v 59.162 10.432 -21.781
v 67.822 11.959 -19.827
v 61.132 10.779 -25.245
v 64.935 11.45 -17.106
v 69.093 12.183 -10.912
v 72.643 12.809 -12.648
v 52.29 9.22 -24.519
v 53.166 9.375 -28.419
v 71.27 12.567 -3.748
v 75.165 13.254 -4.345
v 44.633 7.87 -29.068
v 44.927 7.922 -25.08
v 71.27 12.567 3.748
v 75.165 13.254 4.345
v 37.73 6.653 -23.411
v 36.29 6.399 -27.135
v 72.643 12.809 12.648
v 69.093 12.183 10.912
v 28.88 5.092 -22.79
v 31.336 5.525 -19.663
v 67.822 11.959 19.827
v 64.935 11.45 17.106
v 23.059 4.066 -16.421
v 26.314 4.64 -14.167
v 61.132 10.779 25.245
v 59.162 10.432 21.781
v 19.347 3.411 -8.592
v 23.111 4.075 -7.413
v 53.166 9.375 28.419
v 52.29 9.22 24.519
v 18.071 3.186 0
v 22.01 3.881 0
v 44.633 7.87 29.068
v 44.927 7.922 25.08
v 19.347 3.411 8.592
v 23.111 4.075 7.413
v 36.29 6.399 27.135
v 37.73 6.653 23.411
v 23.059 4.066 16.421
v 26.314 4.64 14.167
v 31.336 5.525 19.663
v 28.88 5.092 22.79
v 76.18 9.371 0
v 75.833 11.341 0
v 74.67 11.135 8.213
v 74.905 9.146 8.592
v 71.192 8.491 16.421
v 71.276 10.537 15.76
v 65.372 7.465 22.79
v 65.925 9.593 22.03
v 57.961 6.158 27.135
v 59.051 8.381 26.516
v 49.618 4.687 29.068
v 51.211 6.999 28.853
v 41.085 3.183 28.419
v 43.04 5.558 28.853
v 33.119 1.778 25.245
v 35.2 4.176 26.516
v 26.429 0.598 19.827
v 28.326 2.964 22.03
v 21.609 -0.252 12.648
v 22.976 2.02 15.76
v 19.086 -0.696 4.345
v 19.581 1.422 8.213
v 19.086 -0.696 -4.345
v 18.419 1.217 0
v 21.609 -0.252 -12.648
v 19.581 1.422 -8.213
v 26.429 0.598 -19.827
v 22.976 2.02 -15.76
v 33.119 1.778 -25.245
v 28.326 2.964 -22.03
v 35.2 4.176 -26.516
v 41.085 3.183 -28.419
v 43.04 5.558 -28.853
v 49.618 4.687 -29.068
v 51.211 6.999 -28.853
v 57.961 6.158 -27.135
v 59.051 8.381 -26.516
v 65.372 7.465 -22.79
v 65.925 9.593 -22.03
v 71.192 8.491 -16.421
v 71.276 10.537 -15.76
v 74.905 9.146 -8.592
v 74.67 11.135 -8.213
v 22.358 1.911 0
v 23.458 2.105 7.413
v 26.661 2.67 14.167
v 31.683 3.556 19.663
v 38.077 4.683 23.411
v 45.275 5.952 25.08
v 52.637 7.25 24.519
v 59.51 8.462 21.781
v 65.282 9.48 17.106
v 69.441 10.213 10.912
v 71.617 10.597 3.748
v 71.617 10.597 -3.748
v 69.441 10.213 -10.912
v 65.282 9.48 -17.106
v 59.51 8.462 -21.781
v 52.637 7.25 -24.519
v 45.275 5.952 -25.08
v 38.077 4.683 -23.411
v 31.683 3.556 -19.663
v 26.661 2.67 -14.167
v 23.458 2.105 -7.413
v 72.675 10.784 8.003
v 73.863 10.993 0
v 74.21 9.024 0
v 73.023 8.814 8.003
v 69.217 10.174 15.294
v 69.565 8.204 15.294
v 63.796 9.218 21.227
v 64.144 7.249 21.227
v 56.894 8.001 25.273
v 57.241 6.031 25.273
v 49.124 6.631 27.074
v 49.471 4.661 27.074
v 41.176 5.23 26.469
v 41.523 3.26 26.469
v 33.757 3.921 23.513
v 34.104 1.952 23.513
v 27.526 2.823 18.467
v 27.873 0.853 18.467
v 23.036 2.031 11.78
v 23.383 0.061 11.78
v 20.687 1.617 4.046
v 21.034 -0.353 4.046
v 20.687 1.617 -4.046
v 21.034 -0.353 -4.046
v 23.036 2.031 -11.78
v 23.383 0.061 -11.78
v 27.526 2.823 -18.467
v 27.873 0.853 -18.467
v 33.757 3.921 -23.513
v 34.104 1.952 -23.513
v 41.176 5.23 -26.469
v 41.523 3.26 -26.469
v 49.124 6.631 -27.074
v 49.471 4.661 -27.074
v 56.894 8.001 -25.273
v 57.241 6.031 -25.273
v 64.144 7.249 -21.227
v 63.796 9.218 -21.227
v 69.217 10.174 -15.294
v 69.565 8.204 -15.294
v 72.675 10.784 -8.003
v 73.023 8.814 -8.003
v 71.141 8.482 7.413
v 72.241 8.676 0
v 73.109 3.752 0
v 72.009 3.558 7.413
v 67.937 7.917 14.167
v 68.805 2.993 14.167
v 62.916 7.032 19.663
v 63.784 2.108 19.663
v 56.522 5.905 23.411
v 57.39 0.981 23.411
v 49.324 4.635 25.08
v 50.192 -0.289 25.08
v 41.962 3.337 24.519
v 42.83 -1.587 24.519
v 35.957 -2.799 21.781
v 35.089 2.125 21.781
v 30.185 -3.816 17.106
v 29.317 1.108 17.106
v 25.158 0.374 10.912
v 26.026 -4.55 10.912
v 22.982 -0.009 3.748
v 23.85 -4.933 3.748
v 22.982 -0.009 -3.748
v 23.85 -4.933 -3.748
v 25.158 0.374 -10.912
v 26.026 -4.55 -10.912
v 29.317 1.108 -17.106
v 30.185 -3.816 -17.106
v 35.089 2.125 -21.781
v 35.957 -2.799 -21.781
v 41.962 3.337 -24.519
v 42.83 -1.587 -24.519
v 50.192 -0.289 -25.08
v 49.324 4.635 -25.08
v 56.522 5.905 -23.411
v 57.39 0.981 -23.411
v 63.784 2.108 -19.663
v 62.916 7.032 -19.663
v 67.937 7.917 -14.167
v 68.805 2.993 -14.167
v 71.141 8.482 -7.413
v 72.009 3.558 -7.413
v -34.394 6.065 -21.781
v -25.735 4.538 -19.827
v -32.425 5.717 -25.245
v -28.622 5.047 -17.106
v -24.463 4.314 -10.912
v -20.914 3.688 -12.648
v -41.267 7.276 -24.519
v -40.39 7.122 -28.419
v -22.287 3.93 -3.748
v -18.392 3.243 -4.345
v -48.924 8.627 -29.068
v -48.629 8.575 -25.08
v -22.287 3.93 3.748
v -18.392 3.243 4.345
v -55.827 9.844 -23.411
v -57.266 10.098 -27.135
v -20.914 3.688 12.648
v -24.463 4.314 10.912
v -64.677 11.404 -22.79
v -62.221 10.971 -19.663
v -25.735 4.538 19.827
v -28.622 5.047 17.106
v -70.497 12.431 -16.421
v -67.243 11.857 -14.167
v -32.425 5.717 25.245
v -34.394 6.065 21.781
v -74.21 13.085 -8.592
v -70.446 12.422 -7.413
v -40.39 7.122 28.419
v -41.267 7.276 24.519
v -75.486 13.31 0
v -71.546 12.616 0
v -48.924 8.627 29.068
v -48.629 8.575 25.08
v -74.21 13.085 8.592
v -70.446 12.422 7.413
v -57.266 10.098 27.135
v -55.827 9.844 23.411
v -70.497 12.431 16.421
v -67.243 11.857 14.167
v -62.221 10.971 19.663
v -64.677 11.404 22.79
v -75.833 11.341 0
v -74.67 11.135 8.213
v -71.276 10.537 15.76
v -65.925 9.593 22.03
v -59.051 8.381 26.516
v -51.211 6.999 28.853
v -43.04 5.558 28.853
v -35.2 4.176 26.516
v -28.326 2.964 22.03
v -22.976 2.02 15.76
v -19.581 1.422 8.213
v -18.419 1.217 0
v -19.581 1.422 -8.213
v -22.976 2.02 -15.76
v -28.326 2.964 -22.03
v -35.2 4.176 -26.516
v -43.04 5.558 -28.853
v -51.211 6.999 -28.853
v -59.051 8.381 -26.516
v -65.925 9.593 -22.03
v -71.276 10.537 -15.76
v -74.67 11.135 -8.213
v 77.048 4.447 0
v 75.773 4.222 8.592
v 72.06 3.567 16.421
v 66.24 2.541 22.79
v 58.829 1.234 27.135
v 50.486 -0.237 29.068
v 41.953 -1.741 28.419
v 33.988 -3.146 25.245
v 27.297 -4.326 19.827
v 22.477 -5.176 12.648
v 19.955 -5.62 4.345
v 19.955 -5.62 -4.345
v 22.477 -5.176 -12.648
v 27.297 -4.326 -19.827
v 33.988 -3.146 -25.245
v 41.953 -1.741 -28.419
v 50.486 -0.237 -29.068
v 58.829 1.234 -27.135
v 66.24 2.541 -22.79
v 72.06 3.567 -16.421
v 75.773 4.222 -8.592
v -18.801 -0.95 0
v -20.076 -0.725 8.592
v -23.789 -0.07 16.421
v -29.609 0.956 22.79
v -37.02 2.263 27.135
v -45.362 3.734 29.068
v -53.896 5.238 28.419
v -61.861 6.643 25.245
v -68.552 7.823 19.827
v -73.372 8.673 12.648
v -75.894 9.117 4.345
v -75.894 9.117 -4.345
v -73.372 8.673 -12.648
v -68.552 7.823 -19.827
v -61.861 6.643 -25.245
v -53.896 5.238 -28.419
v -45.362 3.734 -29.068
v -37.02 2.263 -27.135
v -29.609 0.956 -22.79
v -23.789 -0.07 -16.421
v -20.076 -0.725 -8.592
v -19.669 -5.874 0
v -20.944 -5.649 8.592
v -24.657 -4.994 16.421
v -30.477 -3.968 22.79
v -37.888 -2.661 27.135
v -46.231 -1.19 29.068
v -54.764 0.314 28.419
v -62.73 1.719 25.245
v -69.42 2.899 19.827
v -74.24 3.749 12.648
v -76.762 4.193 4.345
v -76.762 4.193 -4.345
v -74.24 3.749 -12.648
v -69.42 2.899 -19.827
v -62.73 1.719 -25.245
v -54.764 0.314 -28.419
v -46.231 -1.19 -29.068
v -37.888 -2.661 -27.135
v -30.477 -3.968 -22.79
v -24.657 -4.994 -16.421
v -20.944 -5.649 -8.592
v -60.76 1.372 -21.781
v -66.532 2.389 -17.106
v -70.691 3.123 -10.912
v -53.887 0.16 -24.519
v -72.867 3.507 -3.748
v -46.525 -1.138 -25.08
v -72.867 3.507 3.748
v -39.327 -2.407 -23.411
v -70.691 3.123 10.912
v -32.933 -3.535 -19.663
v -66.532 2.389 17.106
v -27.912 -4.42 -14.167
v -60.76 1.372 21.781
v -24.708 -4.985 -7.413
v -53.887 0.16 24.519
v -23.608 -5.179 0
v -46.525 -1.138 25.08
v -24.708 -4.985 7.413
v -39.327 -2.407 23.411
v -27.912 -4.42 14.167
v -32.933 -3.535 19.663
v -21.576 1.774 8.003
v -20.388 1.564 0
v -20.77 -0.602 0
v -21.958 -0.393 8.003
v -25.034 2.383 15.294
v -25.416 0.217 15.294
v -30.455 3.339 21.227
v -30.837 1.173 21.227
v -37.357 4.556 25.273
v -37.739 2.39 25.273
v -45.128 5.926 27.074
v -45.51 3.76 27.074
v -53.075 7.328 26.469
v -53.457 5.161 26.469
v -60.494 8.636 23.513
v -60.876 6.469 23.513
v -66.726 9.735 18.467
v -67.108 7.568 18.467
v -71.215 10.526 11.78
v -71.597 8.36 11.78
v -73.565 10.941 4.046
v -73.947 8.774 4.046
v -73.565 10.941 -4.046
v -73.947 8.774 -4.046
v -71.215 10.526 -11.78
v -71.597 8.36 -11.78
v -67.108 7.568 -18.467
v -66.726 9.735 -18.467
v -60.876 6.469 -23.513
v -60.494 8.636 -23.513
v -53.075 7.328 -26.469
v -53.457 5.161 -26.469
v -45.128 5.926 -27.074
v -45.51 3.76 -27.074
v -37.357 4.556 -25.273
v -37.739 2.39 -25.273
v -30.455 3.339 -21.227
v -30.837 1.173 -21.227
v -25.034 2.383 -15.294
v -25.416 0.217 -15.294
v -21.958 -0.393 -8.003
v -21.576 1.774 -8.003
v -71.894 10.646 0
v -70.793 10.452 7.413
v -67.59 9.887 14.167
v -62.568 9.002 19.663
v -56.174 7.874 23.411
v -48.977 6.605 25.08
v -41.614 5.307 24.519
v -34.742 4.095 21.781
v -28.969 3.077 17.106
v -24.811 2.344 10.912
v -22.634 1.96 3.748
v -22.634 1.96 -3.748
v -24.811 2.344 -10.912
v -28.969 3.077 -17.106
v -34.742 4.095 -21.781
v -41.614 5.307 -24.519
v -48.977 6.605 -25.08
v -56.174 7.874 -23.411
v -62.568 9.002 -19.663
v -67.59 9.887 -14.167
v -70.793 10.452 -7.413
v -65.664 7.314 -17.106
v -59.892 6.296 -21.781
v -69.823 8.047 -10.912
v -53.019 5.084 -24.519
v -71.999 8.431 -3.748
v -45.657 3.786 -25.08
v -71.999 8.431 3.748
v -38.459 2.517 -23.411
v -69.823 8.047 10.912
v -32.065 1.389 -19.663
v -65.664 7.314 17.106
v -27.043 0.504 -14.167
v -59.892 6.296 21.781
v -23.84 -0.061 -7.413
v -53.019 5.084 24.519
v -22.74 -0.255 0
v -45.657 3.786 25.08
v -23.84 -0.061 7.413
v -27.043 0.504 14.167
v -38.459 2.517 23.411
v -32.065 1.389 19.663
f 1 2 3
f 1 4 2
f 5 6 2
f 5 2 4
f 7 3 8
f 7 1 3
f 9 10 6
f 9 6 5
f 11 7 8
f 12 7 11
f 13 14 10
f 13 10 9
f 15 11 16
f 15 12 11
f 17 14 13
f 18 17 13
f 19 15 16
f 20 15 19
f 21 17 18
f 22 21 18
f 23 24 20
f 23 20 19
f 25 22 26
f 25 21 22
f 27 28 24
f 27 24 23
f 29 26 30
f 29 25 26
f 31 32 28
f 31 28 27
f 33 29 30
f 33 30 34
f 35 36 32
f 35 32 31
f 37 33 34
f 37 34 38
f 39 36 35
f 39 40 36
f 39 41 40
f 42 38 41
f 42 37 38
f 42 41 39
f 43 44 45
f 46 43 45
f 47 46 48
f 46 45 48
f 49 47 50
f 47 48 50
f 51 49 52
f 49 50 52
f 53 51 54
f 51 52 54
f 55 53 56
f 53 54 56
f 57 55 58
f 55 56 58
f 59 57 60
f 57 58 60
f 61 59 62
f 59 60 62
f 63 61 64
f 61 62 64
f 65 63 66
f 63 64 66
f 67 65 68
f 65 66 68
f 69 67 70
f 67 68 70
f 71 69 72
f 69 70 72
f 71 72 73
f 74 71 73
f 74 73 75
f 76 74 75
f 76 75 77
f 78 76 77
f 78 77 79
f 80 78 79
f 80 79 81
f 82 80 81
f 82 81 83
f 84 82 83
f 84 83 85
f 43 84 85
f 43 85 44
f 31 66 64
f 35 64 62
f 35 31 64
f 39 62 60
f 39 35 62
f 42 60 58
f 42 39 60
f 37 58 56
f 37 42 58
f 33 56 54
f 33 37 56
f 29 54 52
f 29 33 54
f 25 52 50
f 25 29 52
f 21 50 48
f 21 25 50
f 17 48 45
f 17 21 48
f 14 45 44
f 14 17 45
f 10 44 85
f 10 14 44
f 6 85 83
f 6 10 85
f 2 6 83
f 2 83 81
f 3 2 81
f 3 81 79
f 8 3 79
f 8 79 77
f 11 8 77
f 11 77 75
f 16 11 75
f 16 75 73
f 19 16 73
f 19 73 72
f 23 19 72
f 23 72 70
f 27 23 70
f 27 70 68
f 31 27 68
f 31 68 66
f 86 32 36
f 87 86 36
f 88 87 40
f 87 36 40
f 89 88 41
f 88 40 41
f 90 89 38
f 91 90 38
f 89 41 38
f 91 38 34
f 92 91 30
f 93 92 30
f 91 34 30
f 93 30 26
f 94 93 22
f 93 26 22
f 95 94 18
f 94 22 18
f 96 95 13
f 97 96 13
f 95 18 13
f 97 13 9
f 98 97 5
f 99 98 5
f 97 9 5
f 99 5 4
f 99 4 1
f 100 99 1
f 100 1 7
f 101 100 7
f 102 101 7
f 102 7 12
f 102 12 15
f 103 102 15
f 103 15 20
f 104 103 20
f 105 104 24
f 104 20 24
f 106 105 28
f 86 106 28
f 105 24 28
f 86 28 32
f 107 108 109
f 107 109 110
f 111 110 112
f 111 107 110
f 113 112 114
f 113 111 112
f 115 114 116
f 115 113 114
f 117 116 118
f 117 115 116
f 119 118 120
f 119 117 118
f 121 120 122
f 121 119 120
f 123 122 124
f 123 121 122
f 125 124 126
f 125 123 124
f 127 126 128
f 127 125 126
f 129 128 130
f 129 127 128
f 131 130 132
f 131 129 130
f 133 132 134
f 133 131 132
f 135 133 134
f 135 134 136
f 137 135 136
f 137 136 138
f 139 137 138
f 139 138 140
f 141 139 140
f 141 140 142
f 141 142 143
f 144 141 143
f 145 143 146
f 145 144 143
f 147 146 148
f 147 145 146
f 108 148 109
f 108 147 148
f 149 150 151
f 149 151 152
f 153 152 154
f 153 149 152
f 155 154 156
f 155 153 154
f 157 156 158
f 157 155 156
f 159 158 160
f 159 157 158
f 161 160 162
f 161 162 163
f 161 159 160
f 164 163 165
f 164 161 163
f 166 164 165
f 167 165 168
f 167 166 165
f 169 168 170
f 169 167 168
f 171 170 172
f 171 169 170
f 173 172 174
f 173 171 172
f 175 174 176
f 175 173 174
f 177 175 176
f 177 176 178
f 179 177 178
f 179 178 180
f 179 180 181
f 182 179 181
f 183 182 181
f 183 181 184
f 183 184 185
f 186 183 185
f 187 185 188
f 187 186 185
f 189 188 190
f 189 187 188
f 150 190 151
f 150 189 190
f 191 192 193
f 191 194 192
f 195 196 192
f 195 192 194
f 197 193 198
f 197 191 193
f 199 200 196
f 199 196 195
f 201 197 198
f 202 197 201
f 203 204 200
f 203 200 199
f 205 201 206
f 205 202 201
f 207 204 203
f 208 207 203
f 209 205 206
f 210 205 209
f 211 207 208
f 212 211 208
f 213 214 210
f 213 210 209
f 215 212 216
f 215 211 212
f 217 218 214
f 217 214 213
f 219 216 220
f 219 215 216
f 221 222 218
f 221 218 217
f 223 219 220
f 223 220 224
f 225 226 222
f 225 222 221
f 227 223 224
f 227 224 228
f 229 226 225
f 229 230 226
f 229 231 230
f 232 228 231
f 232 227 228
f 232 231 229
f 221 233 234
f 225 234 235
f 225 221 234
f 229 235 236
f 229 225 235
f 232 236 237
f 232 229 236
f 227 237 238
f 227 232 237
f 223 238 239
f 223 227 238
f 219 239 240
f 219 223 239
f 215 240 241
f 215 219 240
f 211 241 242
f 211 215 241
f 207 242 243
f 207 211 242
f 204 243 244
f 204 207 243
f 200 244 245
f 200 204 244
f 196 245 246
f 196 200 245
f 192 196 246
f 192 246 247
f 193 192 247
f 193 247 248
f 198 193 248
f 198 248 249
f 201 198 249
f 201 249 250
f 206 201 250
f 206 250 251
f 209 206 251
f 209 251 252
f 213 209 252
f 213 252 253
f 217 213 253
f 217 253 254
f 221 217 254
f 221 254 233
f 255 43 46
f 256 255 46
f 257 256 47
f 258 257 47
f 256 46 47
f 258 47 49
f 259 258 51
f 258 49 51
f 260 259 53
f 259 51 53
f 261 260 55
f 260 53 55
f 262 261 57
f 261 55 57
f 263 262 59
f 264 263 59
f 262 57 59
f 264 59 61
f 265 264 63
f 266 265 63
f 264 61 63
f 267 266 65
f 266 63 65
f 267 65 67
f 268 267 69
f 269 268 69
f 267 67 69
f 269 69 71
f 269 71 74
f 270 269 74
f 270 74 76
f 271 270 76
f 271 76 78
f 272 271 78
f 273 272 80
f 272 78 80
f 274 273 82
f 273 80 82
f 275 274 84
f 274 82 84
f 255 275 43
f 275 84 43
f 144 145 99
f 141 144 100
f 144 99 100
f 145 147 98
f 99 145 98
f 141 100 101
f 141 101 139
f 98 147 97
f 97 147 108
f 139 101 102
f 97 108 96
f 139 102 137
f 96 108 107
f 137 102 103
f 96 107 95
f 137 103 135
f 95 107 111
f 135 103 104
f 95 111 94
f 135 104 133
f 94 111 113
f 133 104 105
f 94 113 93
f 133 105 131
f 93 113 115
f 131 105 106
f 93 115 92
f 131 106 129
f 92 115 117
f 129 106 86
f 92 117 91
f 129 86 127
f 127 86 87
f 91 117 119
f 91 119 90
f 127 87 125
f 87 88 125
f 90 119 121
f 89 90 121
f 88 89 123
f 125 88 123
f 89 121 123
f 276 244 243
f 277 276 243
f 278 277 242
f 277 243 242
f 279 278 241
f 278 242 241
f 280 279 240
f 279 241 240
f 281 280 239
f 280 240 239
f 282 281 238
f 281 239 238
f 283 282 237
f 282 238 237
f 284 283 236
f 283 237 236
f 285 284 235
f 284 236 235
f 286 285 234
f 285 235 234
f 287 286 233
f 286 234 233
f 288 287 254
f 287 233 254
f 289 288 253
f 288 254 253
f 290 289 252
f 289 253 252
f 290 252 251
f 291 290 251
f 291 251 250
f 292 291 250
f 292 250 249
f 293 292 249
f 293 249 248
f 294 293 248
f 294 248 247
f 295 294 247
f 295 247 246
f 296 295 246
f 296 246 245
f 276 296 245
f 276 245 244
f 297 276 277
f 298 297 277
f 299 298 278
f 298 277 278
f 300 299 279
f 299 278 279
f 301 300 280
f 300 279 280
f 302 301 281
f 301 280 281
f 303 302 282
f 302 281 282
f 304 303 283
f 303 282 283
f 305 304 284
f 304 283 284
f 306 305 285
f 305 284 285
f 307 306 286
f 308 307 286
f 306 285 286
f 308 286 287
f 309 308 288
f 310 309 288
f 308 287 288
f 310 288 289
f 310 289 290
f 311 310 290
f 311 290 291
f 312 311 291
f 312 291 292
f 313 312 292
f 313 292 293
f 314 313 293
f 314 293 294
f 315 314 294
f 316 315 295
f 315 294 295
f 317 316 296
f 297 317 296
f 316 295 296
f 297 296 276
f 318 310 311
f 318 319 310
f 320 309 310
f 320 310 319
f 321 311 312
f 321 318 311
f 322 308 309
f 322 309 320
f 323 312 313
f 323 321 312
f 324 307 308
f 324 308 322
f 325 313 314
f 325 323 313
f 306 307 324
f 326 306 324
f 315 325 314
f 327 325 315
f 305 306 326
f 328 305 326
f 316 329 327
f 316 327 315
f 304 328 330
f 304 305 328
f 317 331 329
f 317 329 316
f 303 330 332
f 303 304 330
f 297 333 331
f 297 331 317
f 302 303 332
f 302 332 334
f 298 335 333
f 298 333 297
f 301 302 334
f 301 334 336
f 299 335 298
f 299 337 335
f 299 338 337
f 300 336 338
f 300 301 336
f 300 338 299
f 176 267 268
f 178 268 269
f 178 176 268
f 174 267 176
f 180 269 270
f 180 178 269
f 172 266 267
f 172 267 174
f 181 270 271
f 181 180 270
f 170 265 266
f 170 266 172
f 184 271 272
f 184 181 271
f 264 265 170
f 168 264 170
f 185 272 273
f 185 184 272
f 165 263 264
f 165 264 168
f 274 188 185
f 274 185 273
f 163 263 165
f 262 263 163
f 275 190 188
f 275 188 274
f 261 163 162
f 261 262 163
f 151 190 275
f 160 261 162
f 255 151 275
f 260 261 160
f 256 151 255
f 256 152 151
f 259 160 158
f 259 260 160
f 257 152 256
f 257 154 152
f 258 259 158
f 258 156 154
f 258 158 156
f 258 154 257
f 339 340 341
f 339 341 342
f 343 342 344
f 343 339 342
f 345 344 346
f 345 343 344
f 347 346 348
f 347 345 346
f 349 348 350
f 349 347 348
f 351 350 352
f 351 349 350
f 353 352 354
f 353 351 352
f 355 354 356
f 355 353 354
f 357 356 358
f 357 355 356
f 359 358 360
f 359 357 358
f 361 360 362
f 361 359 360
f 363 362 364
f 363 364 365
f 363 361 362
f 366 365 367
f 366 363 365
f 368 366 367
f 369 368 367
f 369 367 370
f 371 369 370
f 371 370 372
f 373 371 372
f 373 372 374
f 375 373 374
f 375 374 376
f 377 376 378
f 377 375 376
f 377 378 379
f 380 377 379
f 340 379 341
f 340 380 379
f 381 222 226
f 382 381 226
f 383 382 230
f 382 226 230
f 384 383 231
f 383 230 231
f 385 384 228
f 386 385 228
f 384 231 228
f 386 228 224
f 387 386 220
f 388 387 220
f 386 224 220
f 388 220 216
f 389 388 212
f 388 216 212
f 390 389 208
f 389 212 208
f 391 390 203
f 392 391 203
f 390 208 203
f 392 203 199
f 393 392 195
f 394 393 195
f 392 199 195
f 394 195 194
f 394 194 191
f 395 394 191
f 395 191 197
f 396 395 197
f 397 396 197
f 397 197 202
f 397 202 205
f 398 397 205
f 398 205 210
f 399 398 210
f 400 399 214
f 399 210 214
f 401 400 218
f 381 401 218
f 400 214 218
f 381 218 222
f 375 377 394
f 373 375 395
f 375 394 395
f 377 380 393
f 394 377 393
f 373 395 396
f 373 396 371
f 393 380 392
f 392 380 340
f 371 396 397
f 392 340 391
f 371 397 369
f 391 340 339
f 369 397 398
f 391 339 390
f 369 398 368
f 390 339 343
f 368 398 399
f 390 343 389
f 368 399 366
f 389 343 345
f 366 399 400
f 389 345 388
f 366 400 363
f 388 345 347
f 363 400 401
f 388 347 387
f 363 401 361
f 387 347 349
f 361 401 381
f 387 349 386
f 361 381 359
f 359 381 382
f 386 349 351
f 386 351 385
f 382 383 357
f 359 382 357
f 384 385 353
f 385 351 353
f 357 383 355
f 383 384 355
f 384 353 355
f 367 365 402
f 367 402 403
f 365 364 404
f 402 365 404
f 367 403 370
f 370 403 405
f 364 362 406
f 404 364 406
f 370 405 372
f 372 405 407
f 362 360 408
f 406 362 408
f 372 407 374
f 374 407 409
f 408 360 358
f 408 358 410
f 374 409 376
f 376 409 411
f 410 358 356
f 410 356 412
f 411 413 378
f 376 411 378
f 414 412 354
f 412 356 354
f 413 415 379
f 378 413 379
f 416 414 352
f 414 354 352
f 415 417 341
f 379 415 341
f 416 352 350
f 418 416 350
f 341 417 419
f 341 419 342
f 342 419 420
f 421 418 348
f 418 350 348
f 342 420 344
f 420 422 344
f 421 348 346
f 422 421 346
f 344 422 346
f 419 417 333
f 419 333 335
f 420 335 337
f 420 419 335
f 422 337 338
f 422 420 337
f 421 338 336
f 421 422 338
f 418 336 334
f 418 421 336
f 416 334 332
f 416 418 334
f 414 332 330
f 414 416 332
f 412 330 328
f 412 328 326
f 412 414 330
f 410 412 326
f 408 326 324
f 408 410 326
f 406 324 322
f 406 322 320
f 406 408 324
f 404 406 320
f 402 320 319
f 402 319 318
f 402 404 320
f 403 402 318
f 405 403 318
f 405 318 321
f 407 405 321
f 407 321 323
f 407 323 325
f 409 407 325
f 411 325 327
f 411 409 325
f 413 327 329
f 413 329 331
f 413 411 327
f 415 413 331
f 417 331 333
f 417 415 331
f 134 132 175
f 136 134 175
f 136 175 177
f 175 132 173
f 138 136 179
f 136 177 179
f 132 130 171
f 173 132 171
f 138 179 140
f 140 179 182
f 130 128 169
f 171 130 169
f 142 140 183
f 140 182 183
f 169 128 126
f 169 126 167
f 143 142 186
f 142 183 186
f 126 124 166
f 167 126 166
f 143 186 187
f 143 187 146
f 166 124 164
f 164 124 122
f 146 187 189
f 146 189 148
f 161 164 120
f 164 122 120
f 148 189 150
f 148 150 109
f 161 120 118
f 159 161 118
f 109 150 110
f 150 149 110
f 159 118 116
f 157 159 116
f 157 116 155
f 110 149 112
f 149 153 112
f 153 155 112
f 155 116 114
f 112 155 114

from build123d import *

# Parameters (mm, degrees)
F2_R      = 29.15
F2_R_2    = 25.15
F3_DEPTH  = 2
F4_R      = 29.15
F4_R_2    = 27.15
F5_DEPTH  = 2.2
F6_R      = 29.15
F6_R_2    = 27.15
F6_R_3    = 25.15
F7_DEPTH  = 5
F9_R      = 29.15
F9_R_2    = 25.15
F10_DEPTH = 2
F11_R     = 29.15
F11_R_2   = 27.15
F12_DEPTH = 2
F13_R     = 29.15
F13_R_2   = 27.15
F13_R_3   = 25.15
F14_DEPTH = 5


with BuildPart() as f3:
    # F2 (on line) → F3 (new body)
    with BuildSketch(Plane(origin=(0, 0, 0), x_dir=(-0.984807753, 0.1736481777, 0), z_dir=(0.1736481777, 0.984807753, 0))):
        with Locations((47.5, 0)):
            Circle(F2_R)
        with Locations((47.5, 0)):
            Circle(F2_R_2, mode=Mode.SUBTRACT)
    extrude(amount=-F3_DEPTH)

    # F4 (on face) → F5 (join)
    with BuildSketch(Plane(origin=(-0.3472963553, -1.969615506, 0), x_dir=(0.984807753, -0.1736481777, 0), z_dir=(-0.1736481777, -0.984807753, 0))):
        with Locations((-47.5, 0)):
            Circle(F4_R)
        with Locations((-47.5, 0)):
            Circle(F4_R_2, mode=Mode.SUBTRACT)
    extrude(amount=F5_DEPTH)

    # F6 (on face) → F7 (join)
    with BuildSketch(Plane(origin=(-0.7293223462, -4.1361925627, 0), x_dir=(0.984807753, -0.1736481777, 0), z_dir=(-0.1736481777, -0.984807753, 0))):
        with Locations((-47.5, 0)):
            Circle(F6_R)
        with Locations((-47.5, 0)):
            Circle(F6_R_2, mode=Mode.SUBTRACT)
        with Locations((-47.5, 0)):
            Circle(F6_R_2)
        with Locations((-47.5, 0)):
            Circle(F6_R_3, mode=Mode.SUBTRACT)
    extrude(amount=F7_DEPTH)


with BuildPart() as f10:
    # F9 (on line) → F10 (new body)
    with BuildSketch(Plane(origin=(0, 0, 0), x_dir=(-0.984807753, -0.1736481777, 0), z_dir=(-0.1736481777, 0.984807753, 0))):
        with Locations((-47.5, 0)):
            Circle(F9_R)
        with Locations((-47.5, 0)):
            Circle(F9_R_2, mode=Mode.SUBTRACT)
    extrude(amount=-F10_DEPTH)

    # F11 (on face) → F12 (join)
    with BuildSketch(Plane(origin=(0.3472963553, -1.969615506, 0), x_dir=(0.984807753, 0.1736481777, 0), z_dir=(0.1736481777, -0.984807753, 0))):
        with Locations((47.5, 0)):
            Circle(F11_R)
        with Locations((47.5, 0)):
            Circle(F11_R_2, mode=Mode.SUBTRACT)
    extrude(amount=F12_DEPTH)

    # F13 (on face) → F14 (join)
    with BuildSketch(Plane(origin=(0.6945927107, -3.939231012, 0), x_dir=(0.984807753, 0.1736481777, 0), z_dir=(0.1736481777, -0.984807753, 0))):
        with Locations((47.5, 0)):
            Circle(F13_R)
        with Locations((47.5, 0)):
            Circle(F13_R_2, mode=Mode.SUBTRACT)
        with Locations((47.5, 0)):
            Circle(F13_R_2)
        with Locations((47.5, 0)):
            Circle(F13_R_3, mode=Mode.SUBTRACT)
    extrude(amount=F14_DEPTH)


solid = Compound([f3.part, f10.part])
